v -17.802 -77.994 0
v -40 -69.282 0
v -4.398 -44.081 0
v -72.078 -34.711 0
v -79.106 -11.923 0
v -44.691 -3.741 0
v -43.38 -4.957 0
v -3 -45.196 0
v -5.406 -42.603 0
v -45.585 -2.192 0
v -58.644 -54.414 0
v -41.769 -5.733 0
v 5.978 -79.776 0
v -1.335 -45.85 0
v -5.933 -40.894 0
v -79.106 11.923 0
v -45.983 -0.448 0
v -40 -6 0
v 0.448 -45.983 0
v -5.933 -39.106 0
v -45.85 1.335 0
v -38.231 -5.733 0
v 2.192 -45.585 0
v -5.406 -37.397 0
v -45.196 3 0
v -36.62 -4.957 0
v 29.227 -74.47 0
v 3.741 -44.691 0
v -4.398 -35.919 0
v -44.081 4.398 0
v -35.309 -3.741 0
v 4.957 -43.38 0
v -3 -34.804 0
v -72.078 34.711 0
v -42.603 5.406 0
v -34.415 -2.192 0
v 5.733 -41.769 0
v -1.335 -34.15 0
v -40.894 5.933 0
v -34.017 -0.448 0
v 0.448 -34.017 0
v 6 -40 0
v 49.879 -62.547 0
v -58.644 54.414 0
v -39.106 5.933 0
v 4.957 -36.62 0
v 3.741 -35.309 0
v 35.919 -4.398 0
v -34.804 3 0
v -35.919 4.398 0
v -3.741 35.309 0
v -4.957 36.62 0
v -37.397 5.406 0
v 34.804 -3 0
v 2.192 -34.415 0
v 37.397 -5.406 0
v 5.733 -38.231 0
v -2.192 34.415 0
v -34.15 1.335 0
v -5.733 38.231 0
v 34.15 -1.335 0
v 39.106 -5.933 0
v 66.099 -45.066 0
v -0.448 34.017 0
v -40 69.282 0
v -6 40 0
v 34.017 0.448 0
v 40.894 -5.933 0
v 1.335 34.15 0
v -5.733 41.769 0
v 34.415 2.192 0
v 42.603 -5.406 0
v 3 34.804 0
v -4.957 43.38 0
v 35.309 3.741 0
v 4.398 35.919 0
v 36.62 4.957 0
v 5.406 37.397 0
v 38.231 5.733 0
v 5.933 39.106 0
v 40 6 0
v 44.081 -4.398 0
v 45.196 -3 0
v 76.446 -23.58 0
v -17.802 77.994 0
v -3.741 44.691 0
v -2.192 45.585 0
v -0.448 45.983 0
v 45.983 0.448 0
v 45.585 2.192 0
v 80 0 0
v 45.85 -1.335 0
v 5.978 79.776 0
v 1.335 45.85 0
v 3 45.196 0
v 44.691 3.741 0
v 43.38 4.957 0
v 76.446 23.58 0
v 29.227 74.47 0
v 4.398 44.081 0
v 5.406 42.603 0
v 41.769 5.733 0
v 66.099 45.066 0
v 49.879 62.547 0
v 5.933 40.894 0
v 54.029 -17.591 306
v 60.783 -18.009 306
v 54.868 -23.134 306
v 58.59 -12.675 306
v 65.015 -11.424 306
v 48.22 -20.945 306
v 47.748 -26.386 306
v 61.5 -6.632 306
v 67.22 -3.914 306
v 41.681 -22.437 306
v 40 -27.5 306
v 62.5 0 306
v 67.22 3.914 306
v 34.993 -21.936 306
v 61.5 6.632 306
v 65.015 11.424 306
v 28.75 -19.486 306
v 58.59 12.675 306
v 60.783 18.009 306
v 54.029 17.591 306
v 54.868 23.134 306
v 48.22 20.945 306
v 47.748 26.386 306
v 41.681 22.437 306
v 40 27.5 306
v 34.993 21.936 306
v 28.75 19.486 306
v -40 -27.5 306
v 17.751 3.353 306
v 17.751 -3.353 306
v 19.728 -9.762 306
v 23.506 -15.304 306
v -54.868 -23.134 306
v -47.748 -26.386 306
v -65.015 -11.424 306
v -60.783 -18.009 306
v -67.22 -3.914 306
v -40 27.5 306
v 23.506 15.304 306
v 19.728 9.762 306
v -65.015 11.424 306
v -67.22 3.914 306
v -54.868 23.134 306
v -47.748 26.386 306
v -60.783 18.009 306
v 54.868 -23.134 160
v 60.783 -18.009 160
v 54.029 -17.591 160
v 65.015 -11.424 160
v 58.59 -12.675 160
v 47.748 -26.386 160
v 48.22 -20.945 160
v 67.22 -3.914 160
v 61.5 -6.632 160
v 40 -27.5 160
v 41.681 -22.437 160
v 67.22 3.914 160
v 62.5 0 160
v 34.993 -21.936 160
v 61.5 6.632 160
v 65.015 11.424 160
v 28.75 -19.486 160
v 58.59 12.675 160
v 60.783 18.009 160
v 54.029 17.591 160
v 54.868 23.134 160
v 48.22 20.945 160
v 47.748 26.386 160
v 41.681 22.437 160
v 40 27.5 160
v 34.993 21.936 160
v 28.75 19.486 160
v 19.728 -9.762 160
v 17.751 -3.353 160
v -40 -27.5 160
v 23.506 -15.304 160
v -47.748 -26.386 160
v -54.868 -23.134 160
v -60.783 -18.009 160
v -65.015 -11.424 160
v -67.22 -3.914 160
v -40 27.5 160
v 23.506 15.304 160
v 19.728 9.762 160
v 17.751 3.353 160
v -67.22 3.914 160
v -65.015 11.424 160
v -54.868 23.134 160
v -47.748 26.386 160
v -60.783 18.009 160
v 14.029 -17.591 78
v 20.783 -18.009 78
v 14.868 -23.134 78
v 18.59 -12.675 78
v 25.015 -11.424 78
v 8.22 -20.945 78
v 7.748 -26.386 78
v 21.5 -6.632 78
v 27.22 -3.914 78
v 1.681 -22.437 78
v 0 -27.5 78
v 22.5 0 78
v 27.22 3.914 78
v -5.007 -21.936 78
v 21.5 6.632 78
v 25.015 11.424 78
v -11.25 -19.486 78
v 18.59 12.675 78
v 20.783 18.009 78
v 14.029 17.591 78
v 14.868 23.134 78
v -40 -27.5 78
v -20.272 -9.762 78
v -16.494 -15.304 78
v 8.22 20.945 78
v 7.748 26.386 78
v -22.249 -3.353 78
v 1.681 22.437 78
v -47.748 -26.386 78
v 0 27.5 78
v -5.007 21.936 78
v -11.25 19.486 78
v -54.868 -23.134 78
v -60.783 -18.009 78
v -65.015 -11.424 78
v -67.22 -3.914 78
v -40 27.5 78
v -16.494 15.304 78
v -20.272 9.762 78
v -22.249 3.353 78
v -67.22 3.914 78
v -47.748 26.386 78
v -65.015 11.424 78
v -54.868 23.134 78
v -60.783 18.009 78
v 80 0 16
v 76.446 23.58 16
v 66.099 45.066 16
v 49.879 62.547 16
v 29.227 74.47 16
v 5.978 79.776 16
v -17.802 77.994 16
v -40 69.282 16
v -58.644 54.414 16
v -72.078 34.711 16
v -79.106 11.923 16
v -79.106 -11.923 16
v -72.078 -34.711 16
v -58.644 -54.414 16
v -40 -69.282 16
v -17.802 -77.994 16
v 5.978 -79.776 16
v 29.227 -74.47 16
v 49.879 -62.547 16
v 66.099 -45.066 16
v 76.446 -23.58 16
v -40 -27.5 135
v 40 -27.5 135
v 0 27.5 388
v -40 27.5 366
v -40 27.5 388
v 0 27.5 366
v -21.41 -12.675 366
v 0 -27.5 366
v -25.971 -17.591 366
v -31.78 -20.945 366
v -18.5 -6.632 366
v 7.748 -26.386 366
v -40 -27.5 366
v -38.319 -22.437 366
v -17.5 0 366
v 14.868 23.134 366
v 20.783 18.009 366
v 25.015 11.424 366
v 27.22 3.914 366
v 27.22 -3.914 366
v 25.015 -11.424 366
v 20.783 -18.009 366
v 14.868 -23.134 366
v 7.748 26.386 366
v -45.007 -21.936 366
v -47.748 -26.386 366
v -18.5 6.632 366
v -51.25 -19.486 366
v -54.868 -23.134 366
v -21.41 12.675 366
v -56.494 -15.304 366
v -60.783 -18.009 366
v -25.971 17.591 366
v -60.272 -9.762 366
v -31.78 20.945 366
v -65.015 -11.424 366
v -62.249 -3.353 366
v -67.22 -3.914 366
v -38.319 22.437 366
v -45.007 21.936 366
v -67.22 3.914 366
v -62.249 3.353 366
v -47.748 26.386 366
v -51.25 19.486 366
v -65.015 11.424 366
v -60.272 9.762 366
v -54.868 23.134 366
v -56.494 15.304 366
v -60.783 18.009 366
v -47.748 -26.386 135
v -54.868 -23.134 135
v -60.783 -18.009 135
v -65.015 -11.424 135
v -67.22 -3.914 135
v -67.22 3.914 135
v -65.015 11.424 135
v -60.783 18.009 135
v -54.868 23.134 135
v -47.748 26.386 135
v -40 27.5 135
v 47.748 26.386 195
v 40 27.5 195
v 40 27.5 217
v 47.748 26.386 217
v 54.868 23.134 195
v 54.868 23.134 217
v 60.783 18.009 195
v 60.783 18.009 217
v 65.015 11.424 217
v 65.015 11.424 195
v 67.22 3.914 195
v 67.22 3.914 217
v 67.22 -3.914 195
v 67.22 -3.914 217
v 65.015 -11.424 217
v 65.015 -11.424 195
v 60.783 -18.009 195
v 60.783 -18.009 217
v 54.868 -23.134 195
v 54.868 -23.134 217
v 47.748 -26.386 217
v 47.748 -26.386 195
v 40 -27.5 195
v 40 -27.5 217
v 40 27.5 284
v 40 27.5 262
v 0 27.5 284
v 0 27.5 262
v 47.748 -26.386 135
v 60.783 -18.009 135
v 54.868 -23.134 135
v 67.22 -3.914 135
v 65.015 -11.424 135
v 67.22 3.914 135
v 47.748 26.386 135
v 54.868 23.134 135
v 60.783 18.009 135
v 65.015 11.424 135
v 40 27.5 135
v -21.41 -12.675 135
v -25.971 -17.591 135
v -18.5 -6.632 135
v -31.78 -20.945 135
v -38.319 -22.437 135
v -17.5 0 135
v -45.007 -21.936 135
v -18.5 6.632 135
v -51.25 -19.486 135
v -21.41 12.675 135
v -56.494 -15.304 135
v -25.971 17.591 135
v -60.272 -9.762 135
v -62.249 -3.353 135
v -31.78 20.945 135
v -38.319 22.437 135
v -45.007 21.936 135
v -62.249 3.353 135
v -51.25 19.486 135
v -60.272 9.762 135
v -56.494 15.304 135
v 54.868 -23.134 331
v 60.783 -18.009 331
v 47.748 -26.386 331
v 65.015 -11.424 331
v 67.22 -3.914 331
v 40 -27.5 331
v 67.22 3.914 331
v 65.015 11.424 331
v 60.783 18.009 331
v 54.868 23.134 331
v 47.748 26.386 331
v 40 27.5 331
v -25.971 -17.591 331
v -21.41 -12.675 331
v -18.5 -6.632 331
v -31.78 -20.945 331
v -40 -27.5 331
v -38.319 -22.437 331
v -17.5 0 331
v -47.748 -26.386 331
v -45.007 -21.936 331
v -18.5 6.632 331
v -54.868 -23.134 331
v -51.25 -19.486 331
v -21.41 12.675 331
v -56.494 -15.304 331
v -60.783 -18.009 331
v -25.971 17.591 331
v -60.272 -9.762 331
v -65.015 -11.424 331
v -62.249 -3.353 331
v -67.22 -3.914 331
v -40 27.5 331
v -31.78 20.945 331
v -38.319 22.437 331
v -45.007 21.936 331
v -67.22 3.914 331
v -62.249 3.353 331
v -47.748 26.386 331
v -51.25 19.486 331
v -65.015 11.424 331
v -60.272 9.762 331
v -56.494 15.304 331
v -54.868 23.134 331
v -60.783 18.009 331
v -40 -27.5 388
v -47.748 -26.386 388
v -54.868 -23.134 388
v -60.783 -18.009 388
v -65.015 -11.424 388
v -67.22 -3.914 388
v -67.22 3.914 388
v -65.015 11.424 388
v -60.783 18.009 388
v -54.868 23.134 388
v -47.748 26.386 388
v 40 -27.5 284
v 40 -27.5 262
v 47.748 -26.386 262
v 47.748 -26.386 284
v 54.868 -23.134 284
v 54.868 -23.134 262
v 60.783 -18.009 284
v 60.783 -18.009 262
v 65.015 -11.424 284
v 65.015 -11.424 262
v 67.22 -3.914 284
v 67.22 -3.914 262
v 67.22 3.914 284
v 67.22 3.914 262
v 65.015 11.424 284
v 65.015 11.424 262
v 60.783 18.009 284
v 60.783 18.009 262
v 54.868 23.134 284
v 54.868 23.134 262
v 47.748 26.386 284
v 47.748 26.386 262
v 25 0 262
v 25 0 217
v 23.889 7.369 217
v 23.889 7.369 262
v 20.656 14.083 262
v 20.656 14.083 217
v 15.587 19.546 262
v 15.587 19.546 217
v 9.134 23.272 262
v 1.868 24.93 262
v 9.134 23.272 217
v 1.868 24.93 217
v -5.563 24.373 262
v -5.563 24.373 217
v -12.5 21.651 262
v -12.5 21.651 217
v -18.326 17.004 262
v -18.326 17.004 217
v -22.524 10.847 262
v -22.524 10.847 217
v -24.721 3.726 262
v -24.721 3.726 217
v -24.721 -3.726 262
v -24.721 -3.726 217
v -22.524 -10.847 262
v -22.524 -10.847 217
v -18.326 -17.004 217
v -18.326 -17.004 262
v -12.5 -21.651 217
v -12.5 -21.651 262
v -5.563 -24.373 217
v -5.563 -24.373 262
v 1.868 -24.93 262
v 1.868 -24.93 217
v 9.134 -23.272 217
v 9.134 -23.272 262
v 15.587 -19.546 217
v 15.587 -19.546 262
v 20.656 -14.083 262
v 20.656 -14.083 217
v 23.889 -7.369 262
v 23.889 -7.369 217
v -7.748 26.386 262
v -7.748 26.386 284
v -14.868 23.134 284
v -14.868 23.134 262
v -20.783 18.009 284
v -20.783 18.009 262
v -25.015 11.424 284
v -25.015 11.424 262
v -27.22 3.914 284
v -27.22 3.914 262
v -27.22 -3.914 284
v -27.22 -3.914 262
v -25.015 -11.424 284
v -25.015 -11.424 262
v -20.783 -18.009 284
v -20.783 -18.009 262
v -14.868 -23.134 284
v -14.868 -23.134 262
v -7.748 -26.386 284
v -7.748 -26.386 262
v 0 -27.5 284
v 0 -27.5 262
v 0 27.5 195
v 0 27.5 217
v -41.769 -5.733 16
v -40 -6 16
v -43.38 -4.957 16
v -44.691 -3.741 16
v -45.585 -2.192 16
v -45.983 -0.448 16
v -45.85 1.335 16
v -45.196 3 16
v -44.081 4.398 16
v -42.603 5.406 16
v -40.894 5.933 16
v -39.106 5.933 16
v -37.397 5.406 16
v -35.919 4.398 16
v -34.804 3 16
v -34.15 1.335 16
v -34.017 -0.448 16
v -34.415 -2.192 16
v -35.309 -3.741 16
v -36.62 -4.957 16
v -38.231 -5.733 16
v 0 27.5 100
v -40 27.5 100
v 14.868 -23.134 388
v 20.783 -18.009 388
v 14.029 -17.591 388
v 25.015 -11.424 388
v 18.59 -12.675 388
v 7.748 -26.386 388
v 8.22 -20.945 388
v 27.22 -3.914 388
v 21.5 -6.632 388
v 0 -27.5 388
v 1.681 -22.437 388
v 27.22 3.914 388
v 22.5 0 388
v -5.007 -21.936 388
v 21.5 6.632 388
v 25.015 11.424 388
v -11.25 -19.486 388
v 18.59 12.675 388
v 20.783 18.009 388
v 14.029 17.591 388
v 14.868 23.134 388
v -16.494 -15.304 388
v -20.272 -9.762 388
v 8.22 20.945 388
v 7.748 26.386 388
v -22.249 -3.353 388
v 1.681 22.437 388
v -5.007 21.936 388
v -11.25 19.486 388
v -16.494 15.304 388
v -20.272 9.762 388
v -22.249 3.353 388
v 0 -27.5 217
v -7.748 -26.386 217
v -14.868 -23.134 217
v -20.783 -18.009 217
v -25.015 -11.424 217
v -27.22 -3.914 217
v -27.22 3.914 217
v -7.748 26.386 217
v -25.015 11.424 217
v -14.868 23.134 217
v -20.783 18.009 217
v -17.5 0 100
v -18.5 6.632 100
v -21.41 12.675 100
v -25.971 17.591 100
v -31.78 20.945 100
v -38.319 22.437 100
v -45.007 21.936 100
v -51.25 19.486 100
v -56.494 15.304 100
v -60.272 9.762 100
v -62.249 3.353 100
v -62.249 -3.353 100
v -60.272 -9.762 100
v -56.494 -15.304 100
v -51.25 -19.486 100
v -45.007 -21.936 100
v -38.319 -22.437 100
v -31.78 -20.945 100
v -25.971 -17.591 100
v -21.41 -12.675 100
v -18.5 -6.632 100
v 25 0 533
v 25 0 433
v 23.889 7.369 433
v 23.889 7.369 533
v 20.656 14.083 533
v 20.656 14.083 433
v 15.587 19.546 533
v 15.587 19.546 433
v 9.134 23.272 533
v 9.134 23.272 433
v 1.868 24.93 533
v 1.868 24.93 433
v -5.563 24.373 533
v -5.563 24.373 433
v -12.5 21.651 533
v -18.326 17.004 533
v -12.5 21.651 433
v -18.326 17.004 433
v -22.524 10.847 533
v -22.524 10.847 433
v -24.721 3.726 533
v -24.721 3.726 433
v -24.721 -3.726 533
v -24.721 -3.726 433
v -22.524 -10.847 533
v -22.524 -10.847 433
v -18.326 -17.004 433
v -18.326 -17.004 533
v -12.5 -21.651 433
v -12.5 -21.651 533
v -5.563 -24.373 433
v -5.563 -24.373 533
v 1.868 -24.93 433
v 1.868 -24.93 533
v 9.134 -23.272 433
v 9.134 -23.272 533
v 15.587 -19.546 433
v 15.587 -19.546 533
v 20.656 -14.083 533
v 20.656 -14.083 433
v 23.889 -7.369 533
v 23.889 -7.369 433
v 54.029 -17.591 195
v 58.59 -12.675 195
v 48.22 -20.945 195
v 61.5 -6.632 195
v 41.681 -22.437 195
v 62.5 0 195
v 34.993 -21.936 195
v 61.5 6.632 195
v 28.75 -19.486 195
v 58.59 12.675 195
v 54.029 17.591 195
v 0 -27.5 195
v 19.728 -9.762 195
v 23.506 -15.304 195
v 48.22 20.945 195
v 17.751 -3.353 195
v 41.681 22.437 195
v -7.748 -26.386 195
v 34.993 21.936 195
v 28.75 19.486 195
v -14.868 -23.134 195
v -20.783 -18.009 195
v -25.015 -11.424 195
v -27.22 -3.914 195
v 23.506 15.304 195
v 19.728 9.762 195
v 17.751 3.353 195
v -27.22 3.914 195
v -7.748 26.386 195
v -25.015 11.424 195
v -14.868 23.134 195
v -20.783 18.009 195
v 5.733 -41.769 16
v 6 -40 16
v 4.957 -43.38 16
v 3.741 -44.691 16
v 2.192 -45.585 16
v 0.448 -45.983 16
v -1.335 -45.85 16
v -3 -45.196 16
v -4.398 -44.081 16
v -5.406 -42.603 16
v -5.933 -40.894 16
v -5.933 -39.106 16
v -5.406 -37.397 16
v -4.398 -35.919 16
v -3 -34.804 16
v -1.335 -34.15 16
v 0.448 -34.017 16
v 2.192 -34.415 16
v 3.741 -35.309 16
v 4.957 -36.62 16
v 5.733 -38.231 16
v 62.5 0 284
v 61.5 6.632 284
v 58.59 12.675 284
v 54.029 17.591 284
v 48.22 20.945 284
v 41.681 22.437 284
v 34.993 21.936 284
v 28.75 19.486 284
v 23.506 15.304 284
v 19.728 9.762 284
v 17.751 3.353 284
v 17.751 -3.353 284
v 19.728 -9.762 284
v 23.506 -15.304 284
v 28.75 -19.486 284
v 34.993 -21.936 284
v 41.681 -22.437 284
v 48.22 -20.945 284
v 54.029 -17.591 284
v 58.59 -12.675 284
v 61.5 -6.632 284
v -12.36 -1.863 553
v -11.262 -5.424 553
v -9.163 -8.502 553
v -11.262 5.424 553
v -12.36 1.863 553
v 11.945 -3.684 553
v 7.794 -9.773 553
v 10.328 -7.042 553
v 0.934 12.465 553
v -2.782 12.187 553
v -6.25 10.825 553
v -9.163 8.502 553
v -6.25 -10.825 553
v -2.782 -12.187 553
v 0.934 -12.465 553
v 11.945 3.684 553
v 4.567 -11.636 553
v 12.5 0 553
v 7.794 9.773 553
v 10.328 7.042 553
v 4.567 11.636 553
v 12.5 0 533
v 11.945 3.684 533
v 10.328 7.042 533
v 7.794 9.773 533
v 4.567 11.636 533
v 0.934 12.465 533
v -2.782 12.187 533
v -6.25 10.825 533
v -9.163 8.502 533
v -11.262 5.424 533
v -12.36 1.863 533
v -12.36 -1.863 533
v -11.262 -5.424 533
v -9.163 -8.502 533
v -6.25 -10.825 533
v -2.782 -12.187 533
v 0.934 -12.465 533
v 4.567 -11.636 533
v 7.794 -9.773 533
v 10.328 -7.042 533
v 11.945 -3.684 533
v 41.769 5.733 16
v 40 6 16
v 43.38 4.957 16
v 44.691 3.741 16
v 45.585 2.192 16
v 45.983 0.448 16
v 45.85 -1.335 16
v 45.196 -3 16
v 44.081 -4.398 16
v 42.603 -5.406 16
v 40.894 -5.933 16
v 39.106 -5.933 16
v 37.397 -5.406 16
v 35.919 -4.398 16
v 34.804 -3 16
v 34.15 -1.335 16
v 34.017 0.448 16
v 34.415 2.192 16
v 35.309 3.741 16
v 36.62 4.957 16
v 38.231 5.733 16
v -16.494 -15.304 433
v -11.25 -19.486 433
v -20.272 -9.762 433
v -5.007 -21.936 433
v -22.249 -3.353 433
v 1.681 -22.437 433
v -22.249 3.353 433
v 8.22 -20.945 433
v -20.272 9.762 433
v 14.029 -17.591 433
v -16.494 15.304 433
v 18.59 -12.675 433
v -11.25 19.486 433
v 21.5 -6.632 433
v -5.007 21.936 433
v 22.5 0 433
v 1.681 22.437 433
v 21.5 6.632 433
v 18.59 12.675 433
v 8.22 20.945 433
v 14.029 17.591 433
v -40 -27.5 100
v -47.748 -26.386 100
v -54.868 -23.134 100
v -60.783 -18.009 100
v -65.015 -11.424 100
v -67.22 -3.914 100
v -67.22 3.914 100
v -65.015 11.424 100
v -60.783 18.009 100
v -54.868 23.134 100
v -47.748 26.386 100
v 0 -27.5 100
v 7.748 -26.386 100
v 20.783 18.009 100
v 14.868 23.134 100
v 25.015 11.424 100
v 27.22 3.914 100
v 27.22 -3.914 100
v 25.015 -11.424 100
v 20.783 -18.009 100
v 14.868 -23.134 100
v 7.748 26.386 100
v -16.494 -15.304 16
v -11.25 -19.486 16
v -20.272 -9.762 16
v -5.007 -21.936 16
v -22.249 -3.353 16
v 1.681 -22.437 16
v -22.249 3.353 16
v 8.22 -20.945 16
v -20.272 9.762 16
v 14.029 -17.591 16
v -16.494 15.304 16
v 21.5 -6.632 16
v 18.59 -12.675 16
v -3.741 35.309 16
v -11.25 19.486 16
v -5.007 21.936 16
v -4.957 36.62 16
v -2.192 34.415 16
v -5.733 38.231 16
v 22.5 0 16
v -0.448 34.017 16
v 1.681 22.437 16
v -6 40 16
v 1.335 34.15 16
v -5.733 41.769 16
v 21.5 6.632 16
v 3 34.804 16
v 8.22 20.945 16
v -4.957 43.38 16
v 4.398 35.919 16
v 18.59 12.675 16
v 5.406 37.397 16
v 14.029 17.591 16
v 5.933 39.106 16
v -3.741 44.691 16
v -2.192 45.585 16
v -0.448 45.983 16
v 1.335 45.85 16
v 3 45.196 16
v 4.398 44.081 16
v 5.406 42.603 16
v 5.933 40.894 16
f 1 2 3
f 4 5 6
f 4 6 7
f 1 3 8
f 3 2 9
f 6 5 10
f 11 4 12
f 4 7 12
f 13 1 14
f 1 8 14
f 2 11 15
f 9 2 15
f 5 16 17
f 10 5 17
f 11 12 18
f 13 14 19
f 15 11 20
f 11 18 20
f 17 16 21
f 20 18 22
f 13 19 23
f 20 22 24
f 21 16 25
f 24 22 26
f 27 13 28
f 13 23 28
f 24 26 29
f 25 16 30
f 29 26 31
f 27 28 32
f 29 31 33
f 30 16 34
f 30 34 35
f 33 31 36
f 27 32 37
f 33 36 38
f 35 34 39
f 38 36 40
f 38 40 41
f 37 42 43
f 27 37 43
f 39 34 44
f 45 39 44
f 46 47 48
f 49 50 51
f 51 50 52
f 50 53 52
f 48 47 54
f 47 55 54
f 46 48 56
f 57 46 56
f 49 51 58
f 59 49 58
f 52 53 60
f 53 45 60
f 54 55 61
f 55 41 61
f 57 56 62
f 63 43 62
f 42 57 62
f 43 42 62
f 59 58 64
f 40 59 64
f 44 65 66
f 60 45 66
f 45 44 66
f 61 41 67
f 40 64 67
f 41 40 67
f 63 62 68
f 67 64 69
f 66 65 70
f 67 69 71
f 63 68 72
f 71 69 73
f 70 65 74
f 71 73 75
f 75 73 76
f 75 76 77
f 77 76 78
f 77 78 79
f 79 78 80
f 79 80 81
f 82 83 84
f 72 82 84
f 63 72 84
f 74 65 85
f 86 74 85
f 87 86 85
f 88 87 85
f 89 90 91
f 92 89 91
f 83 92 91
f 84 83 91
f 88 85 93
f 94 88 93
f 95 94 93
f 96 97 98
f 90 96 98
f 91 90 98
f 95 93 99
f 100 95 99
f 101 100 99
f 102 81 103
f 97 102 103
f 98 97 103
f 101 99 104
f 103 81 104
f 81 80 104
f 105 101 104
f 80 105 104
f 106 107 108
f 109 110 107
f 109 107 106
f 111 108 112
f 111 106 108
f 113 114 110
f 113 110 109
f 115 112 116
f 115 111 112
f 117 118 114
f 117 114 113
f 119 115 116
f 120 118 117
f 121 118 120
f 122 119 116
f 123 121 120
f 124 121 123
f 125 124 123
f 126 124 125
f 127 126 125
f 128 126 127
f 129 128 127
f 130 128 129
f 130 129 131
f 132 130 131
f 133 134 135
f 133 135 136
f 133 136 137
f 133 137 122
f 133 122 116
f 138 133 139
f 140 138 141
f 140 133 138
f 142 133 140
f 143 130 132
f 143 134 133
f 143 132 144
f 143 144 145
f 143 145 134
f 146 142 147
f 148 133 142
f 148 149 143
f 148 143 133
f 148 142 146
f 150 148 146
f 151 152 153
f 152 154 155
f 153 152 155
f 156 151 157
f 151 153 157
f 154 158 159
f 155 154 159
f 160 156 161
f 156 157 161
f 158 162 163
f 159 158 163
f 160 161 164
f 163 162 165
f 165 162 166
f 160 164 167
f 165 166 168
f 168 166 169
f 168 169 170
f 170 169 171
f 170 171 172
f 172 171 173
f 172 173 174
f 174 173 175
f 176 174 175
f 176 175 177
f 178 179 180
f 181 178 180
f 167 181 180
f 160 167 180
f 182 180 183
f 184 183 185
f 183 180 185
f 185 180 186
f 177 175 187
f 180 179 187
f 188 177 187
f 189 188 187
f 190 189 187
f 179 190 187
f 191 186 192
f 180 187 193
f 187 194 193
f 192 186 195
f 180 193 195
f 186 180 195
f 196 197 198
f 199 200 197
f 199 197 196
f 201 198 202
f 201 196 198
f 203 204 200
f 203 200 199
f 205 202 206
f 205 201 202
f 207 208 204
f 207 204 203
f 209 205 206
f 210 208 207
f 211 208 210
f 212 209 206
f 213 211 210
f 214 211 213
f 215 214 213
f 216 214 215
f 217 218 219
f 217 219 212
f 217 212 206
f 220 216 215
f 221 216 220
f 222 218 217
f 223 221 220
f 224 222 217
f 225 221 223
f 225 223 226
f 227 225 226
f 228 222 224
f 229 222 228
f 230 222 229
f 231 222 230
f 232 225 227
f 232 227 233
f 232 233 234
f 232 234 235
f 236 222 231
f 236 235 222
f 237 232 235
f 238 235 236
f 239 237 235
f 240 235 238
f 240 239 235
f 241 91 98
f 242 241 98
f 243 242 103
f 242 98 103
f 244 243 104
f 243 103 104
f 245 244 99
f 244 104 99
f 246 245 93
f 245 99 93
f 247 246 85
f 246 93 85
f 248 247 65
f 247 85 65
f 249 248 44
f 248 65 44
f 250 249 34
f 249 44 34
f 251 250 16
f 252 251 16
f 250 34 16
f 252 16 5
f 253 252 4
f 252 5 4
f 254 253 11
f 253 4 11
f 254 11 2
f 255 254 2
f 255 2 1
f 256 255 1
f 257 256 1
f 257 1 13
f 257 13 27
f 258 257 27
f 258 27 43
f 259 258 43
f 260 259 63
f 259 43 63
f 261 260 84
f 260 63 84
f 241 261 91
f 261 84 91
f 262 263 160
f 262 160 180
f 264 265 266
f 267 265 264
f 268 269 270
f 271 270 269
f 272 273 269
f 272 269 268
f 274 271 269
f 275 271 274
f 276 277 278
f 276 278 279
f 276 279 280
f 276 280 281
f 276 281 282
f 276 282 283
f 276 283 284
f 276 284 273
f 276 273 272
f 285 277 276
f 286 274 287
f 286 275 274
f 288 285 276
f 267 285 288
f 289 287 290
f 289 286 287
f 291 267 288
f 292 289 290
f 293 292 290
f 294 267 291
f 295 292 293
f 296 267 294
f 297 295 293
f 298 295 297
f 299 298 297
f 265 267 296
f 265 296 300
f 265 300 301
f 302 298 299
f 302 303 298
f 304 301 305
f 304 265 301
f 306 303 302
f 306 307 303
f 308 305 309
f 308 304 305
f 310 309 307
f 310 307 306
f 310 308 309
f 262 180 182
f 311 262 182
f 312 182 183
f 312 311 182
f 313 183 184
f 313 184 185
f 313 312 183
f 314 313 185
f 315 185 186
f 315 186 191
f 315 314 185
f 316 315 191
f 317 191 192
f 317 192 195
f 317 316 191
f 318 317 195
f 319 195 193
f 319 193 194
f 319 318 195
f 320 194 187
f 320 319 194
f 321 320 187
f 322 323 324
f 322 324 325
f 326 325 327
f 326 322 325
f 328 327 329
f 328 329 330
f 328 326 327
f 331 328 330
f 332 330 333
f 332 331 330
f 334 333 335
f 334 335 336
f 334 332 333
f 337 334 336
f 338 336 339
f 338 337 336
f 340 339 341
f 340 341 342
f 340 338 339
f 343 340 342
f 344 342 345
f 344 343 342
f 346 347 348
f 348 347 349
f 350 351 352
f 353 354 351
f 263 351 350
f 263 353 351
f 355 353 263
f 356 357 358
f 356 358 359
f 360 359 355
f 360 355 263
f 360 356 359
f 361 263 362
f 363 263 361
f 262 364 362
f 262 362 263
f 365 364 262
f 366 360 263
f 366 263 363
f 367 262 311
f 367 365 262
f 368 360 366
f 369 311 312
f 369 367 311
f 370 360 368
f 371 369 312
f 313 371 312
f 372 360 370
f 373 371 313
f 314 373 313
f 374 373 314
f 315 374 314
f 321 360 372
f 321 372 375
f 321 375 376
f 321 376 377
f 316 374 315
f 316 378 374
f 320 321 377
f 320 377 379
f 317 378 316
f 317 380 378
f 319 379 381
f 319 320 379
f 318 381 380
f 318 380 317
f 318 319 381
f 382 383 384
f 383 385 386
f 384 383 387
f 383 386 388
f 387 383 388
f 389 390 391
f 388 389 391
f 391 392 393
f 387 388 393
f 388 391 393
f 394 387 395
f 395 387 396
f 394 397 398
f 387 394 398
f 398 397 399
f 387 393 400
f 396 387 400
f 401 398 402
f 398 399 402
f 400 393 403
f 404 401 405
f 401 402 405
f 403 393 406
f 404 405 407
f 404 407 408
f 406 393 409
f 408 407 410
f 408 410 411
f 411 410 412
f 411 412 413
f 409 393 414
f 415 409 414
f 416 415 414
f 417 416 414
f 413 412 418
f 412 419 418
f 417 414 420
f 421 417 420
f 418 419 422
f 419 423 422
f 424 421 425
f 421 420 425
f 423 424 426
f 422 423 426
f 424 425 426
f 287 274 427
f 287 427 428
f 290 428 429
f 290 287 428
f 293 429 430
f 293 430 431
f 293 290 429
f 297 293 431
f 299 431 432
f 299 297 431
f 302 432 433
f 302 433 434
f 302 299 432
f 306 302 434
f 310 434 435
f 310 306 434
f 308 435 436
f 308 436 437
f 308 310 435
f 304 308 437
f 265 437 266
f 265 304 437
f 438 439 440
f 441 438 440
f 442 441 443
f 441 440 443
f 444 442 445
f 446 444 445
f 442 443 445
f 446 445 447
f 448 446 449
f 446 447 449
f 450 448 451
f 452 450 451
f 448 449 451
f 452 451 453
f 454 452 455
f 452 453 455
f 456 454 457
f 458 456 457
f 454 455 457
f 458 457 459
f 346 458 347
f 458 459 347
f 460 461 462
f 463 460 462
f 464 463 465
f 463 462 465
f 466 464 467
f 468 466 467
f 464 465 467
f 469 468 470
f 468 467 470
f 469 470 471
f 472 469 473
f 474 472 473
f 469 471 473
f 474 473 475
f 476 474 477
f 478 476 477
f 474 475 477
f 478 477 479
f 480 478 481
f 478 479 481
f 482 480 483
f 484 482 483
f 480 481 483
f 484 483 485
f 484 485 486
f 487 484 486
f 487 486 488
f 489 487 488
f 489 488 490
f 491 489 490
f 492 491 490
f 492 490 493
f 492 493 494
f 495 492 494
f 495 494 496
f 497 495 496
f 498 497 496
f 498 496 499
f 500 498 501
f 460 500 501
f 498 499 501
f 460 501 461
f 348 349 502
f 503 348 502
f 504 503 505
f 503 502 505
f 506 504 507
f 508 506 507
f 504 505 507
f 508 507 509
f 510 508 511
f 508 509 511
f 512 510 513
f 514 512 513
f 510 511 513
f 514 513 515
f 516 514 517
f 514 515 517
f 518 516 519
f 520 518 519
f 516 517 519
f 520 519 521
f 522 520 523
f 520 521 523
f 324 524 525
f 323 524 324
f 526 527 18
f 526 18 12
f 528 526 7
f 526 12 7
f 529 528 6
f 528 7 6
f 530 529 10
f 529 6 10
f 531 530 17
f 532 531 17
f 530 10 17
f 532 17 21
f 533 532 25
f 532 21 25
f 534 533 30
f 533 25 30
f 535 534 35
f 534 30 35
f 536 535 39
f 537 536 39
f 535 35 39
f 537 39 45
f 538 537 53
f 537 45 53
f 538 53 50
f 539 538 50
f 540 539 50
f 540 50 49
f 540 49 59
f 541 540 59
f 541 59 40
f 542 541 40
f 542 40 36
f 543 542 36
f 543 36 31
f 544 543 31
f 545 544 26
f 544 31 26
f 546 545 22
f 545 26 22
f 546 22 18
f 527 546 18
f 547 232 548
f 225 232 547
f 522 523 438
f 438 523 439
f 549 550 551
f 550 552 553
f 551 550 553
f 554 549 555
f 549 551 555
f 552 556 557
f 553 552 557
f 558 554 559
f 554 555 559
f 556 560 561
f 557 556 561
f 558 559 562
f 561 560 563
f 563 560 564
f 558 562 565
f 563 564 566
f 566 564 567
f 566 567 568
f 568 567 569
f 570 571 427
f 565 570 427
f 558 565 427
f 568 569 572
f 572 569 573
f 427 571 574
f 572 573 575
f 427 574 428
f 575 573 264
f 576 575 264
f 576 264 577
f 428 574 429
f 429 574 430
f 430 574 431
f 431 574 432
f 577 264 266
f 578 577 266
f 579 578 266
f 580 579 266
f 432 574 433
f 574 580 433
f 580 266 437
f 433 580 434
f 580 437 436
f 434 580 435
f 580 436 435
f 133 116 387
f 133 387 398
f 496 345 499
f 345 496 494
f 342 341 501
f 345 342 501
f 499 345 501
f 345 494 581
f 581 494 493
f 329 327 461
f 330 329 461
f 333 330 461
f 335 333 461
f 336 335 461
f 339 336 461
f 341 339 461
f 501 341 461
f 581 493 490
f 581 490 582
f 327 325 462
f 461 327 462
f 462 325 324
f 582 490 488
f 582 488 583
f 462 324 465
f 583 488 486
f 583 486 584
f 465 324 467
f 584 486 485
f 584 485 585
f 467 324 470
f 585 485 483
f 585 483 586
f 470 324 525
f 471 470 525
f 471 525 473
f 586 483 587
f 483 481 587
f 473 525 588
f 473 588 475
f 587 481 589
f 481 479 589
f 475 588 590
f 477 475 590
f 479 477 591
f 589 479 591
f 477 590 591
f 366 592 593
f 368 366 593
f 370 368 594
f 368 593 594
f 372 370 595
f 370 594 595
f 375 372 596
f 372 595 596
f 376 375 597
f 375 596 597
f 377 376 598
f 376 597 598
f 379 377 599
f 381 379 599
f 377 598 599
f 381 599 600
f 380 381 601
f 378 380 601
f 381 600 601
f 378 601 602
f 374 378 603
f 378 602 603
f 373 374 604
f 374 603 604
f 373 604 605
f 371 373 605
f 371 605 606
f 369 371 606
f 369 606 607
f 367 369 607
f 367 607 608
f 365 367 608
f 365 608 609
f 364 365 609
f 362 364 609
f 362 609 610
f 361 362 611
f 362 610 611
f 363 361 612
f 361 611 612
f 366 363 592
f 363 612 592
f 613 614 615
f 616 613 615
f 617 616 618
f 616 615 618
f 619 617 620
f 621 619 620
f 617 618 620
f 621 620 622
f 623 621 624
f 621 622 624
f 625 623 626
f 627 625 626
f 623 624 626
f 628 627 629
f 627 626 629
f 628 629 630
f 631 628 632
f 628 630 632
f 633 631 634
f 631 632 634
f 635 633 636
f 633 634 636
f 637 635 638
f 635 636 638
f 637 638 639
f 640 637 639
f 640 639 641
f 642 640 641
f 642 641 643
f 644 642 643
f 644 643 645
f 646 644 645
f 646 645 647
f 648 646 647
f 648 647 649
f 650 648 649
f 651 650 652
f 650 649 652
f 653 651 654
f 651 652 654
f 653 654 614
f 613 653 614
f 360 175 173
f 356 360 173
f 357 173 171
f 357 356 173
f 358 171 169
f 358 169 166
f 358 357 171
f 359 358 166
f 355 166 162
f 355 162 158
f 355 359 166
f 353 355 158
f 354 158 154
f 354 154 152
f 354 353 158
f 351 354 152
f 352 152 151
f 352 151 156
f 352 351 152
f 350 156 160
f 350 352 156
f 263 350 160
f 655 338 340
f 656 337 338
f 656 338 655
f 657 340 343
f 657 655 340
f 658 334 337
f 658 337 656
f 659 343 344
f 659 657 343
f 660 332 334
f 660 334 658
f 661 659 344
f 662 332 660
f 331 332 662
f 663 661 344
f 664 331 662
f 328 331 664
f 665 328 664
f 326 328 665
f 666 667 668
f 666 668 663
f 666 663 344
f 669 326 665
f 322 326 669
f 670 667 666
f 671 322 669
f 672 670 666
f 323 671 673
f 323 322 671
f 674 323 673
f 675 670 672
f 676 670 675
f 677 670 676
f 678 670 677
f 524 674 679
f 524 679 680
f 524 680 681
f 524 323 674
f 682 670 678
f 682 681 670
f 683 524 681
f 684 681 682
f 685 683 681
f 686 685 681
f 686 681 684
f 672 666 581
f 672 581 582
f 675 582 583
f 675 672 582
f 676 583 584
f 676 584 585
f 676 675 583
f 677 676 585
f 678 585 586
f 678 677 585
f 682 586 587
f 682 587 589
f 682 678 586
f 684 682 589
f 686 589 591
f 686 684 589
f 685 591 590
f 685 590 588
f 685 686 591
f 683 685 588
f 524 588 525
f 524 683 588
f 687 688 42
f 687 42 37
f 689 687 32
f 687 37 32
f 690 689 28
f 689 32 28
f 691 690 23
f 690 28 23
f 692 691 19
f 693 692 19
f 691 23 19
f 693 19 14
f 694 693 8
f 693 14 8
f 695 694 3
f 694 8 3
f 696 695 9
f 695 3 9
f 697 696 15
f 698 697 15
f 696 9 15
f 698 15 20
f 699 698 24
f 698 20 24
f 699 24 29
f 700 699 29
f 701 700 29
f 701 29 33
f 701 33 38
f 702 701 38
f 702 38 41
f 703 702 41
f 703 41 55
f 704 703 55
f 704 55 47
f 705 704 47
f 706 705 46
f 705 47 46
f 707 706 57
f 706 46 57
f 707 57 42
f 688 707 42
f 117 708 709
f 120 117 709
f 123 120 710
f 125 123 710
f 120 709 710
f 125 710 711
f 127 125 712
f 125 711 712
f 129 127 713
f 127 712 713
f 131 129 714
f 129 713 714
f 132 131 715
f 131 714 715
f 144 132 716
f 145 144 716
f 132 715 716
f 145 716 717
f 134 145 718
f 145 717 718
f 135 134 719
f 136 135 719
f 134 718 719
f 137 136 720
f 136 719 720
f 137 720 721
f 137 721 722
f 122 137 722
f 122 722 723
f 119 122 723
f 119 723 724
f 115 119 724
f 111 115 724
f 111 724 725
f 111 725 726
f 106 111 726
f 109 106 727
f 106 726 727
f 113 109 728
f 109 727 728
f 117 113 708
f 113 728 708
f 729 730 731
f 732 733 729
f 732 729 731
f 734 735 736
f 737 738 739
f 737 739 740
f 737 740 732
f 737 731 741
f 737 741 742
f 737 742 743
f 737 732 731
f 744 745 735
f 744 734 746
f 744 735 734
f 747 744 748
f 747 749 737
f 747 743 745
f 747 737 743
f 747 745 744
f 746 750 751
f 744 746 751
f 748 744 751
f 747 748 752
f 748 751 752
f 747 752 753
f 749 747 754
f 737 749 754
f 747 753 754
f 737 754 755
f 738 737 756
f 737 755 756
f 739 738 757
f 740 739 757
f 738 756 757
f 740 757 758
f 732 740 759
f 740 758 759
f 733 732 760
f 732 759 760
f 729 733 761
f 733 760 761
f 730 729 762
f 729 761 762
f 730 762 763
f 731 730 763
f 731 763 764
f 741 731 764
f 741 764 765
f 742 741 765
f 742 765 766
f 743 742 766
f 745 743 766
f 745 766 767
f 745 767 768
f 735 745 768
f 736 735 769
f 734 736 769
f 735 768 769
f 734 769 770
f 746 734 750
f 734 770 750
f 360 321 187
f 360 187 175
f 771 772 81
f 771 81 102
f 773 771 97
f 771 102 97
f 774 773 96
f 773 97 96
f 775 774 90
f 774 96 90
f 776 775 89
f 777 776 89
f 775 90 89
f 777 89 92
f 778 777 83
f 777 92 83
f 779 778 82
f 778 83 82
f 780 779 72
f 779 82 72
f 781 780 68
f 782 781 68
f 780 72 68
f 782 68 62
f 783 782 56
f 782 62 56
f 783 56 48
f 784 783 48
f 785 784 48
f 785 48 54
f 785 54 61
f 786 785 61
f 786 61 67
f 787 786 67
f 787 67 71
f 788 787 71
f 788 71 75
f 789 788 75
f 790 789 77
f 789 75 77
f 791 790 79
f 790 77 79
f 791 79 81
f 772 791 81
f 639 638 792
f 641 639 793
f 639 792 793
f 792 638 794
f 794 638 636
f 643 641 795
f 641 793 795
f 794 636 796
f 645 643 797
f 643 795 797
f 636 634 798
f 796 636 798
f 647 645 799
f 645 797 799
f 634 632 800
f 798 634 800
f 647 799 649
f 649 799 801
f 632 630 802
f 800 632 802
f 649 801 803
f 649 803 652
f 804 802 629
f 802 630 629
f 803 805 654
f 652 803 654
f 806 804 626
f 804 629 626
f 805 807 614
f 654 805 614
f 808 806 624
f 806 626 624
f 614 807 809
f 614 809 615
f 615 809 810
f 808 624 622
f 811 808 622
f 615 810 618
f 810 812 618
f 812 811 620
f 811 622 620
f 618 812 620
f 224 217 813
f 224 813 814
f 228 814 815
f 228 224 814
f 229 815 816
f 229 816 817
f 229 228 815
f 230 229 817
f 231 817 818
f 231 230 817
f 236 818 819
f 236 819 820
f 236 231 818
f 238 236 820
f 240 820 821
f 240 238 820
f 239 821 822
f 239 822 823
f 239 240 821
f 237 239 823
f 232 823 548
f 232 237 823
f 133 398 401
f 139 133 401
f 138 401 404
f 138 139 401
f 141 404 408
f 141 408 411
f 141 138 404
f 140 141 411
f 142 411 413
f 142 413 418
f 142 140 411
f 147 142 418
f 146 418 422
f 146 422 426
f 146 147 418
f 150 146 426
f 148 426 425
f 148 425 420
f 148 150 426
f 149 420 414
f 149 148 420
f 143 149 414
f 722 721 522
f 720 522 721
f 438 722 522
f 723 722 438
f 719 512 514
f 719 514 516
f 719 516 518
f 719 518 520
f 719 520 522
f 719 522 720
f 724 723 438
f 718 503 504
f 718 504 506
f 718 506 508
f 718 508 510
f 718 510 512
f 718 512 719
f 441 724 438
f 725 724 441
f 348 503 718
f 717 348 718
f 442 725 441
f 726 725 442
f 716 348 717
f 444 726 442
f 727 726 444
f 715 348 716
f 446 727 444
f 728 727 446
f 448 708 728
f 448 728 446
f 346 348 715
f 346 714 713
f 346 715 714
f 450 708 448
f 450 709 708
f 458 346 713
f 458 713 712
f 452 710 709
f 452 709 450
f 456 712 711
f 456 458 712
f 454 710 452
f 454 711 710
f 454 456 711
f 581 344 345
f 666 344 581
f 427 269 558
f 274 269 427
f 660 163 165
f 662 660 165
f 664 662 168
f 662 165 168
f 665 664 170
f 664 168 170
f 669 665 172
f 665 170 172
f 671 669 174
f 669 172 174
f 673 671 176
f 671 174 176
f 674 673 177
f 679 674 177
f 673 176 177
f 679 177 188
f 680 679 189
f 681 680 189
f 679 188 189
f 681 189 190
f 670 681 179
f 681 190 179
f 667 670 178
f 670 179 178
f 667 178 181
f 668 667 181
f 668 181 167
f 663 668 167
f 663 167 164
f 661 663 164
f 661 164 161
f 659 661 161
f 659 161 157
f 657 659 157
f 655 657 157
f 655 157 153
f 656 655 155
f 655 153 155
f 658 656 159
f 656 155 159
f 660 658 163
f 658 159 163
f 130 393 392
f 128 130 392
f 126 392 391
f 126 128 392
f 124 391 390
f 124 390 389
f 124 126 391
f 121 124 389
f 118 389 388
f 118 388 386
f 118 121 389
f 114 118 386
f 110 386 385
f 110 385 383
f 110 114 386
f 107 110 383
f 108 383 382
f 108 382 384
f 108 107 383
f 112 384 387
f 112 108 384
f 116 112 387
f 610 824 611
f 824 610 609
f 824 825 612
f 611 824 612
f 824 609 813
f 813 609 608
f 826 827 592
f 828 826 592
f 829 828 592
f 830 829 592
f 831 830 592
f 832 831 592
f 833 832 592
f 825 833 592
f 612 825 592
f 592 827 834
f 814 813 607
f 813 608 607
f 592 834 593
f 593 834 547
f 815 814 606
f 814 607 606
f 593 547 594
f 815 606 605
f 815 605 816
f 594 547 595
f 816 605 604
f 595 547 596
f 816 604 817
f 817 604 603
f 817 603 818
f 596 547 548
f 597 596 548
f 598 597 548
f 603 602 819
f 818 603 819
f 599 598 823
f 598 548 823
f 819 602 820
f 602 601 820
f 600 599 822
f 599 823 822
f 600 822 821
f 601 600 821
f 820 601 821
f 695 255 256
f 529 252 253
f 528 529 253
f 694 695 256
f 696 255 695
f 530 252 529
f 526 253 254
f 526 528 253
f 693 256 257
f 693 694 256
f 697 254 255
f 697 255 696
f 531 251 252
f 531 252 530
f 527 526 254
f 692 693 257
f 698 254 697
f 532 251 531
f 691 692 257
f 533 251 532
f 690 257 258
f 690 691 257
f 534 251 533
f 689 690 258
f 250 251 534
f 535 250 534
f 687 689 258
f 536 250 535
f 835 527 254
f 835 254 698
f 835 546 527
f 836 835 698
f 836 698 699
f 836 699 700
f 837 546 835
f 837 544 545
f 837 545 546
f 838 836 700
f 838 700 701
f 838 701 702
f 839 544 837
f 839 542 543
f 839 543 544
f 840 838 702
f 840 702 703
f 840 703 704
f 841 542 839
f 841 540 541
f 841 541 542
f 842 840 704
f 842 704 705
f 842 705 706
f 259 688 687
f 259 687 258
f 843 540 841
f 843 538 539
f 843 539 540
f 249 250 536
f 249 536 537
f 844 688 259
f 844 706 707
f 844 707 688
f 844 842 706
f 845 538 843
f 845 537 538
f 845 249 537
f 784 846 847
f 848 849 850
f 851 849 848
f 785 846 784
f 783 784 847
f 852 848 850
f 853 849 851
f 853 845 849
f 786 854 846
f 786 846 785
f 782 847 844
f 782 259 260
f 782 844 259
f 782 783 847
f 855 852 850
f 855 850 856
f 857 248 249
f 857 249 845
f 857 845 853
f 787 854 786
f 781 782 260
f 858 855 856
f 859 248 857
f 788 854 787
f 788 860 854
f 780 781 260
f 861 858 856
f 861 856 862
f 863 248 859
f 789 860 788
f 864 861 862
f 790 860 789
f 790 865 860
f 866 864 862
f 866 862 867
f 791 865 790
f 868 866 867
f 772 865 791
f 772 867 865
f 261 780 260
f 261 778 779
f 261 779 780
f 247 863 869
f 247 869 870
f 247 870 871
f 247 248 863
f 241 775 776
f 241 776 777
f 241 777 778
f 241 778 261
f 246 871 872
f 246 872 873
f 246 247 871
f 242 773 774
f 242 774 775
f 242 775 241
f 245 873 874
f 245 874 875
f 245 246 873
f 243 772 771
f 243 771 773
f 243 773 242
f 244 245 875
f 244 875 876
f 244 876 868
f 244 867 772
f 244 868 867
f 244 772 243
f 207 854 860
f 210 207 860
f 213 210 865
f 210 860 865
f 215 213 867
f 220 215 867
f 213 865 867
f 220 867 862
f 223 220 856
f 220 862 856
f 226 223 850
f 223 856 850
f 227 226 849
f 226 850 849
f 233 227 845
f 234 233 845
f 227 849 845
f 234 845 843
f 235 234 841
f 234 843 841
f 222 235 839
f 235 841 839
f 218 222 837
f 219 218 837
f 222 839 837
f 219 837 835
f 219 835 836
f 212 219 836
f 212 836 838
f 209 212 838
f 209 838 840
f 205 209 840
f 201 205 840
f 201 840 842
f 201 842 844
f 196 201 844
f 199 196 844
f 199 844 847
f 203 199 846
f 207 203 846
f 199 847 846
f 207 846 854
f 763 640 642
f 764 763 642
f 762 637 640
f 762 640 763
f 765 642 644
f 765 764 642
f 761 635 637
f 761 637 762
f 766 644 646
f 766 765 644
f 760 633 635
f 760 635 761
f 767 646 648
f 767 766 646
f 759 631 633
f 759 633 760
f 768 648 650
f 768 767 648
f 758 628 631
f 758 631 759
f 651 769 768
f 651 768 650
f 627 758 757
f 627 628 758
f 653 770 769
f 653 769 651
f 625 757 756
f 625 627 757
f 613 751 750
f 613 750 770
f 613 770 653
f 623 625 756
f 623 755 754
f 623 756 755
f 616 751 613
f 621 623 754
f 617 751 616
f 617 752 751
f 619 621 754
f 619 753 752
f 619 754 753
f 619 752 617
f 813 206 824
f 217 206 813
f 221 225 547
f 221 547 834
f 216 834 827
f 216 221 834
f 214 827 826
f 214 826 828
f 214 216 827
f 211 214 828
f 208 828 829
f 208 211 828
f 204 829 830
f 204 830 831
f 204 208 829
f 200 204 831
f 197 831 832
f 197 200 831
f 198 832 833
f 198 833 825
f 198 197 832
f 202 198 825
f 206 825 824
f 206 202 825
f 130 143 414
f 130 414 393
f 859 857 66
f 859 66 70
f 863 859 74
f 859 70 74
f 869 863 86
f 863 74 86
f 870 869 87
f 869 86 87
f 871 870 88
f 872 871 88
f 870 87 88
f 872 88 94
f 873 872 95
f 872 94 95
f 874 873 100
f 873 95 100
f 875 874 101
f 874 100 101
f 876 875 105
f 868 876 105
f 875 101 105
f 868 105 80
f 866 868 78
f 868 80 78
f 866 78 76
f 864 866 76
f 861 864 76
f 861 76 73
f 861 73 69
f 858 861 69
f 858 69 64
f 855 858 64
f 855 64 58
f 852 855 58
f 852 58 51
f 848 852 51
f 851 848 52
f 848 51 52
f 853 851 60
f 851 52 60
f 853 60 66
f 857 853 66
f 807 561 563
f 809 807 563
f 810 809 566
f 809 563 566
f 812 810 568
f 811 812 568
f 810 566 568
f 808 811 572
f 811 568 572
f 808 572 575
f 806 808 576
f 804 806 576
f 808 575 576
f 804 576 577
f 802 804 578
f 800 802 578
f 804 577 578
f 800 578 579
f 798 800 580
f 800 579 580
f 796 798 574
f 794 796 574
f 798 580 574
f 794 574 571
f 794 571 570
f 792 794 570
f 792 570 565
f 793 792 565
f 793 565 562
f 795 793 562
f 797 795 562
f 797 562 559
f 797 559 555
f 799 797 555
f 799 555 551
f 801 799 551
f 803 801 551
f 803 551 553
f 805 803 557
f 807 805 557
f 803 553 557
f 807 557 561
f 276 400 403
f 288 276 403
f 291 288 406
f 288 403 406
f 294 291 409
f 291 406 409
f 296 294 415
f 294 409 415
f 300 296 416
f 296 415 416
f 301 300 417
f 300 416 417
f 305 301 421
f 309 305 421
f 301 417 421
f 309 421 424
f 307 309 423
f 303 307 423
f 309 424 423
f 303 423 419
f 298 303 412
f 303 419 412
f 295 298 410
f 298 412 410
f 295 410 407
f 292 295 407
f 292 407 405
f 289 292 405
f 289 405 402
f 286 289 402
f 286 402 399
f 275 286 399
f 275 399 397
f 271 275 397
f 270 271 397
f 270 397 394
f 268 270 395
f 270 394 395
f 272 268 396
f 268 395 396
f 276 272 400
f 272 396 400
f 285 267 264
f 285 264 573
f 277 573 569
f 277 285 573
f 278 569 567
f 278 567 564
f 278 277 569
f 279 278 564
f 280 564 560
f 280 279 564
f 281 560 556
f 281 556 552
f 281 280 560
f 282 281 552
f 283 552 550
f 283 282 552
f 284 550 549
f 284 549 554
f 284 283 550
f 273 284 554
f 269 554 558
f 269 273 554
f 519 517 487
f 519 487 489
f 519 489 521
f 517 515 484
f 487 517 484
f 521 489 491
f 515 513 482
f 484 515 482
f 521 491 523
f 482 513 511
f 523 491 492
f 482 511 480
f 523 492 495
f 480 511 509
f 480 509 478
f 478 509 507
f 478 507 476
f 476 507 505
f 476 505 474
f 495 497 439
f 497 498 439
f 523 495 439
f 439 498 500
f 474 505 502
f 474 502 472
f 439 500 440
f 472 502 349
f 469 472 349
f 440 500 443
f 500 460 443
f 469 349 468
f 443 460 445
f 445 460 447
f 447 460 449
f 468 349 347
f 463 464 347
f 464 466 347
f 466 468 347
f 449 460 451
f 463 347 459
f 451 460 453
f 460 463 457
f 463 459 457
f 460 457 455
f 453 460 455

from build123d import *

# Parameters (mm, degrees)
SKETCH1_R            = 80
BOSS_EXTRUDE1_DEPTH  = 16
SKETCH2_R            = 22.5
BOSS_EXTRUDE2_DEPTH  = 62
BOSS_EXTRUDE3_DEPTH  = 22
SKETCH4_R            = 22.5
BOSS_EXTRUDE4_DEPTH  = 35
BOSS_EXTRUDE5_DEPTH  = 25
SKETCH6_R            = 22.5
BOSS_EXTRUDE6_DEPTH  = 35
BOSS_EXTRUDE7_DEPTH  = 22
SKETCH8_R            = 25
BOSS_EXTRUDE8_DEPTH  = 45
BOSS_EXTRUDE9_DEPTH  = 22
SKETCH10_R           = 22.5
BOSS_EXTRUDE10_DEPTH = 22
BOSS_EXTRUDE11_DEPTH = 25
SKETCH12_R           = 22.5
BOSS_EXTRUDE12_DEPTH = 35
BOSS_EXTRUDE13_DEPTH = 22
SKETCH14_R           = 22.5
BOSS_EXTRUDE14_DEPTH = 45
SKETCH15_R           = 25
BOSS_EXTRUDE15_DEPTH = 100
SKETCH16_R           = 12.5
BOSS_EXTRUDE16_DEPTH = 20
SKETCH17_R           = 6
CUT_EXTRUDE1_DEPTH   = 16
CIRPATTERN1_COUNT    = 4


with BuildPart() as part:
    # Sketch1 → Boss-Extrude1 (new body)
    with BuildSketch(Plane.XY):
        Circle(SKETCH1_R)
    extrude(amount=BOSS_EXTRUDE1_DEPTH)

    # Sketch2 → Boss-Extrude2 (add)
    with BuildSketch(Plane.XY.offset(16)):
        Circle(SKETCH2_R)
    extrude(amount=BOSS_EXTRUDE2_DEPTH)

    # Sketch3 → Boss-Extrude3 (add)
    with BuildSketch(Plane.XY.offset(78)):
        with BuildLine():
            Line((0, -27.5), (-40, -27.5))
            ThreePointArc((-40, -27.5), (-67.5, 0), (-40, 27.5))
            Line((-40, 27.5), (0, 27.5))
            ThreePointArc((0, 27.5), (27.5, 0), (0, -27.5))
        make_face()
    extrude(amount=BOSS_EXTRUDE3_DEPTH)

    # Sketch4 → Boss-Extrude4 (add)
    with BuildSketch(Plane.XY.offset(100)):
        with Locations((-40, 0)):
            Circle(SKETCH4_R)
    extrude(amount=BOSS_EXTRUDE4_DEPTH)

    # Sketch5 → Boss-Extrude5 (add)
    with BuildSketch(Plane.XY.offset(135)):
        with BuildLine():
            Line((-40, 27.5), (40, 27.5))
            ThreePointArc((40, 27.5), (67.5, 0), (40, -27.5))
            Line((40, -27.5), (-40, -27.5))
            ThreePointArc((-40, -27.5), (-67.5, 0), (-40, 27.5))
        make_face()
    extrude(amount=BOSS_EXTRUDE5_DEPTH)

    # Sketch6 → Boss-Extrude6 (add)
    with BuildSketch(Plane.XY.offset(160)):
        with Locations((40, 0)):
            Circle(SKETCH6_R)
    extrude(amount=BOSS_EXTRUDE6_DEPTH)

    # Sketch7 → Boss-Extrude7 (add)
    with BuildSketch(Plane.XY.offset(195)):
        with BuildLine():
            Line((40, -27.5), (0, -27.5))
            ThreePointArc((0, -27.5), (-27.5, 0), (0, 27.5))
            Line((0, 27.5), (40, 27.5))
            ThreePointArc((40, 27.5), (67.5, 0), (40, -27.5))
        make_face()
    extrude(amount=BOSS_EXTRUDE7_DEPTH)

    # Sketch8 → Boss-Extrude8 (add)
    with BuildSketch(Plane.XY.offset(217)):
        Circle(SKETCH8_R)
    extrude(amount=BOSS_EXTRUDE8_DEPTH)

    # Sketch9 → Boss-Extrude9 (add)
    with BuildSketch(Plane.XY.offset(262)):
        with BuildLine():
            Line((40, 27.5), (0, 27.5))
            ThreePointArc((0, 27.5), (-27.5, 0), (0, -27.5))
            Line((0, -27.5), (40, -27.5))
            ThreePointArc((40, -27.5), (67.5, 0), (40, 27.5))
        make_face()
    extrude(amount=BOSS_EXTRUDE9_DEPTH)

    # Sketch10 → Boss-Extrude10 (add)
    with BuildSketch(Plane.XY.offset(284)):
        with Locations((40, 0)):
            Circle(SKETCH10_R)
    extrude(amount=BOSS_EXTRUDE10_DEPTH)

    # Sketch11 → Boss-Extrude11 (add)
    with BuildSketch(Plane.XY.offset(306)):
        with BuildLine():
            Line((40, -27.5), (-40, -27.5))
            ThreePointArc((-40, -27.5), (-67.5, 0), (-40, 27.5))
            Line((-40, 27.5), (40, 27.5))
            ThreePointArc((40, 27.5), (67.5, 0), (40, -27.5))
        make_face()
    extrude(amount=BOSS_EXTRUDE11_DEPTH)

    # Sketch12 → Boss-Extrude12 (add)
    with BuildSketch(Plane.XY.offset(331)):
        with Locations((-40, 0)):
            Circle(SKETCH12_R)
    extrude(amount=BOSS_EXTRUDE12_DEPTH)

    # Sketch13 → Boss-Extrude13 (add)
    with BuildSketch(Plane.XY.offset(366)):
        with BuildLine():
            Line((-40, 27.5), (0, 27.5))
            ThreePointArc((0, 27.5), (27.5, 0), (0, -27.5))
            Line((0, -27.5), (-40, -27.5))
            ThreePointArc((-40, -27.5), (-67.5, 0), (-40, 27.5))
        make_face()
    extrude(amount=BOSS_EXTRUDE13_DEPTH)

    # Sketch14 → Boss-Extrude14 (add)
    with BuildSketch(Plane.XY.offset(388)):
        Circle(SKETCH14_R)
    extrude(amount=BOSS_EXTRUDE14_DEPTH)

    # Sketch15 → Boss-Extrude15 (add)
    with BuildSketch(Plane.XY.offset(433)):
        Circle(SKETCH15_R)
    extrude(amount=BOSS_EXTRUDE15_DEPTH)

    # Sketch16 → Boss-Extrude16 (add)
    with BuildSketch(Plane.XY.offset(533)):
        Circle(SKETCH16_R)
    extrude(amount=BOSS_EXTRUDE16_DEPTH)

    # Sketch17 → Cut-Extrude1 (cut)
    with BuildSketch(Plane(origin=(0, 0, 0), x_dir=(-1, 0, 0), z_dir=(0, 0, -1))):
        with Locations((0, 40)):
            Circle(SKETCH17_R)
    cut_extrude1 = extrude(amount=-CUT_EXTRUDE1_DEPTH, mode=Mode.SUBTRACT)

    # CirPattern1: Cut-Extrude1 ×4 about axis
    cirpattern1_axis = Axis((0, 0, 0), (0, 0, 1))
    for i in range(1, CIRPATTERN1_COUNT):
        add(cut_extrude1.rotate(cirpattern1_axis, i * 360 / CIRPATTERN1_COUNT), mode=Mode.SUBTRACT)


solid = part.part
